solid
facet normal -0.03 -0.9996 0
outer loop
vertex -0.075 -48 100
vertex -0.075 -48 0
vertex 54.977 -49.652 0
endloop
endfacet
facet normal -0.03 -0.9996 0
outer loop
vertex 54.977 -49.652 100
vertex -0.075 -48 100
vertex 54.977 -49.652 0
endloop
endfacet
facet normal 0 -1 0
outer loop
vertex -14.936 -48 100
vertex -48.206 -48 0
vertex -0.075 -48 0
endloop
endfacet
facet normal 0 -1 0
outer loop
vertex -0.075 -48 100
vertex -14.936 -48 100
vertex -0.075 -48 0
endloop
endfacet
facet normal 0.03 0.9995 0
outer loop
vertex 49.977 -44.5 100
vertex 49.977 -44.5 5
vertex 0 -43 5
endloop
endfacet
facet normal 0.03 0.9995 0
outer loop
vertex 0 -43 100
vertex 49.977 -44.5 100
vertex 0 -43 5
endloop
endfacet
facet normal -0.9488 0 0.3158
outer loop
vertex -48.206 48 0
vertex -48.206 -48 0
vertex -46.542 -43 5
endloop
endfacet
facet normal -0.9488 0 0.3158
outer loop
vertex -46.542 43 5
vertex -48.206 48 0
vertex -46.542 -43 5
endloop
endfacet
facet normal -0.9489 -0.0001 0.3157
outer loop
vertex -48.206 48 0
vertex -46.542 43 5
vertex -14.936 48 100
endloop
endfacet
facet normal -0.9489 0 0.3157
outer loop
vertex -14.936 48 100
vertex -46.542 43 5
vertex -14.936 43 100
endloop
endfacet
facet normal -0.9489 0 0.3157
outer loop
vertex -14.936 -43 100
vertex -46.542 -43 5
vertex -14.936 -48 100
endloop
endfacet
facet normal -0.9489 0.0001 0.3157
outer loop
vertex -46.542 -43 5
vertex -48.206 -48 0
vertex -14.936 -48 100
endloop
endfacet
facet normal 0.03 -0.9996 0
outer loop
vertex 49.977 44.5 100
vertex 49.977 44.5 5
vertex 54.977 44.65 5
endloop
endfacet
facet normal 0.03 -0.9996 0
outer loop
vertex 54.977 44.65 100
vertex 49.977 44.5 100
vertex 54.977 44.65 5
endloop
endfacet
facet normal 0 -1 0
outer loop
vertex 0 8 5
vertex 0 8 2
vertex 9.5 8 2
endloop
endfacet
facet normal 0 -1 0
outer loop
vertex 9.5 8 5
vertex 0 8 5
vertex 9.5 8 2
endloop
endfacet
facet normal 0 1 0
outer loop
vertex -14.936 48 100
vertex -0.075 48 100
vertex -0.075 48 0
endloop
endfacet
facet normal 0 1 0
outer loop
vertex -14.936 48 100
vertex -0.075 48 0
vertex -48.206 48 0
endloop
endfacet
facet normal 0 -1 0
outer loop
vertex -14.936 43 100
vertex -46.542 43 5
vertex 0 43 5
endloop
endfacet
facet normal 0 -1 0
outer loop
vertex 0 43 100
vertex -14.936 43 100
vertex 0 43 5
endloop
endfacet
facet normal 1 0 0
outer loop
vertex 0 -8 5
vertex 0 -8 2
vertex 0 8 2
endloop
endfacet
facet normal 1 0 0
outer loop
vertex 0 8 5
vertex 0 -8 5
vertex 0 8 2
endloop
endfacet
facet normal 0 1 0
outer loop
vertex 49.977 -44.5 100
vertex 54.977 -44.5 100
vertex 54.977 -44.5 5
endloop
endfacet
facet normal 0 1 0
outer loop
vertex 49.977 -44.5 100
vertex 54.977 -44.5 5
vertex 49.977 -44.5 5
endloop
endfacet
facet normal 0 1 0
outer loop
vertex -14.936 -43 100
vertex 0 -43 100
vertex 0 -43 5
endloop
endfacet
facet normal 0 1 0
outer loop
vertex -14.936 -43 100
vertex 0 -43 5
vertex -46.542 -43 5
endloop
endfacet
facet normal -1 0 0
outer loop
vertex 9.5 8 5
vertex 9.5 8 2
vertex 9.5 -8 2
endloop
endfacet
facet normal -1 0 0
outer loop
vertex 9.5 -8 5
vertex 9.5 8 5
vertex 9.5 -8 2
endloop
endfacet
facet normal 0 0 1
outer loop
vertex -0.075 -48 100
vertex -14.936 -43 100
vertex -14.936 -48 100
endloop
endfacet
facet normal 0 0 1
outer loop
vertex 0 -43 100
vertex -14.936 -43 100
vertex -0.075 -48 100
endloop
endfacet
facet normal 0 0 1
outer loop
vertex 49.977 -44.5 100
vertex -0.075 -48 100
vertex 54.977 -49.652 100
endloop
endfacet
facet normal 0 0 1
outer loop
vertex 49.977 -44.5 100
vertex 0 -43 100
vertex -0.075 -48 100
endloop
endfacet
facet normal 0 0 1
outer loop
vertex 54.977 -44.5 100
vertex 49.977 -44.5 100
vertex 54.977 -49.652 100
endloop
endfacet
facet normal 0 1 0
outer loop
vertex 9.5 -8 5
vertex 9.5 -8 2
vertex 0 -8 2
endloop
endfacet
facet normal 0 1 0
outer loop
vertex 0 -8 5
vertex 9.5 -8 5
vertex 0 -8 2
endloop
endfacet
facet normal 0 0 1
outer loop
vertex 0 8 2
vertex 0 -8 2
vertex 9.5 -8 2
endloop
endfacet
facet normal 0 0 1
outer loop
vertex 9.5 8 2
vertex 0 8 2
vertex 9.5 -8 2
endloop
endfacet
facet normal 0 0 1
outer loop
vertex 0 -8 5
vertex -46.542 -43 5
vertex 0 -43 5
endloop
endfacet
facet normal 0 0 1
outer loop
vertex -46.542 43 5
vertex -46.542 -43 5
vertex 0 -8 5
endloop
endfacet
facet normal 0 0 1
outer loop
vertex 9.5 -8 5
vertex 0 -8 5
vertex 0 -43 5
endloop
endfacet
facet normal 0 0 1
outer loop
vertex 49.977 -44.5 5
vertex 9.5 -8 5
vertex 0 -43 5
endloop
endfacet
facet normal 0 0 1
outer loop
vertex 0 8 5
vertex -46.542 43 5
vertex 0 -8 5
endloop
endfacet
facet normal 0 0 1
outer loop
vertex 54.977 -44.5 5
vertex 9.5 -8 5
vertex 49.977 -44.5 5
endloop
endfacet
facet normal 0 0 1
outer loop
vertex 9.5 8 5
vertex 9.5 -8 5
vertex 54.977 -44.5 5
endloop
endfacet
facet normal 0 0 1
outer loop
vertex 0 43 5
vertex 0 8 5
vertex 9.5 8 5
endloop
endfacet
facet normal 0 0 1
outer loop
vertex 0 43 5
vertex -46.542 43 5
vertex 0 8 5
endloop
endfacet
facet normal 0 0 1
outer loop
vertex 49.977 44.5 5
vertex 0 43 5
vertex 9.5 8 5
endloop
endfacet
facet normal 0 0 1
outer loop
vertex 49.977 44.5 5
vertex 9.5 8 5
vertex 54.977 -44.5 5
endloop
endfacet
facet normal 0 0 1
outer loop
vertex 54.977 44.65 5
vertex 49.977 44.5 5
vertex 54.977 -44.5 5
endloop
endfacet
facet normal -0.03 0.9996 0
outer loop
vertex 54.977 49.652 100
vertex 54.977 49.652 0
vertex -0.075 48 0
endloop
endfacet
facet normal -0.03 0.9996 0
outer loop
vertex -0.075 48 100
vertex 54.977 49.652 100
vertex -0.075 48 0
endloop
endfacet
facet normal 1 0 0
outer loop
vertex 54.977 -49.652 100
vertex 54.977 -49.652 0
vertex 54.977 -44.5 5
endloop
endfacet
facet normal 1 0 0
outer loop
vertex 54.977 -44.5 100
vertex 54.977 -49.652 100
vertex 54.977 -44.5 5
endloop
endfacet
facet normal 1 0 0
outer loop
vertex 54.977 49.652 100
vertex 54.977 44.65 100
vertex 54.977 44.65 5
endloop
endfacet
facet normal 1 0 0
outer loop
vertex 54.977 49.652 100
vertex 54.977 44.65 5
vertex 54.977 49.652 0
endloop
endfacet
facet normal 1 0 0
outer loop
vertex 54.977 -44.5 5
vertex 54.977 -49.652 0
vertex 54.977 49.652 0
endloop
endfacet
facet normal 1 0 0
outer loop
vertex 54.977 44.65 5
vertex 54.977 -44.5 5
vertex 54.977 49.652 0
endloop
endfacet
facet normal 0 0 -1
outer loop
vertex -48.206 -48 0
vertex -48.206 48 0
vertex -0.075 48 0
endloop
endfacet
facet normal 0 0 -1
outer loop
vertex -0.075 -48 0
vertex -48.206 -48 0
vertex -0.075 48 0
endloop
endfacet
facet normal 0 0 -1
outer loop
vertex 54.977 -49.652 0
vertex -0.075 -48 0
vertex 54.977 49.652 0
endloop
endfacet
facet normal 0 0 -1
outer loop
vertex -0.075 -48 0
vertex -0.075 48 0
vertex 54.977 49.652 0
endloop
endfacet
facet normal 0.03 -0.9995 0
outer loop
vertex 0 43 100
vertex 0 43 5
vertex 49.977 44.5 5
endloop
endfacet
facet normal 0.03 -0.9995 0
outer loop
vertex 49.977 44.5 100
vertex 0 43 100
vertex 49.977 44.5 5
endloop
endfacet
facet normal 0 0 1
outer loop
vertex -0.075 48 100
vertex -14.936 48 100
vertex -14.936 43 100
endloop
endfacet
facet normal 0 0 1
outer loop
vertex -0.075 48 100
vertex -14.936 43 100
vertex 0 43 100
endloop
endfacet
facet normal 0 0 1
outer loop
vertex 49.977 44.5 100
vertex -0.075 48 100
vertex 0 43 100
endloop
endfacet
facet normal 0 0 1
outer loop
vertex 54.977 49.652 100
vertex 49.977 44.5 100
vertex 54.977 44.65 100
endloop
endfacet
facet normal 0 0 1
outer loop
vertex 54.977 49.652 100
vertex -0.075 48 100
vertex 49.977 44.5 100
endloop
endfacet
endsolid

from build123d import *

# Parameters (mm, degrees)
F1_DEPTH = 5
F2_DEPTH = 100
F3_DEPTH = 2
F5_DEPTH = 96


with BuildPart() as f1:
    # F0 (on Top) → F1 (new body)
    with BuildSketch(Plane.XY):
        Polygon((49.977495, 44.5), (0, 43), (-50, 43), (-50, -43), (0, -43), (49.977495, -44.5), (54.977495, -44.5), (54.977495, 44.650068), align=None)
        Polygon((0, -8), (0, 8), (9.5, 8), (9.5, 0), (9.5, -8), align=None, mode=Mode.SUBTRACT)
    extrude(amount=F1_DEPTH)

    # F0 (on Top) → F2 (join)
    with BuildSketch(Plane.XY):
        Polygon((-50, 43), (0, 43), (49.977495, 44.5), (54.977495, 44.650068), (54.977495, 49.652319), (-0.075017, 48), (-55, 48), (-55, -48), (-0.075017, -48), (54.977495, -49.652319), (54.977495, -44.5), (49.977495, -44.5), (0, -43), (-50, -43), align=None)
    extrude(amount=F2_DEPTH)

    # F0 (on Top) → F3 (join)
    with BuildSketch(Plane.XY):
        Polygon((9.5, 8), (0, 8), (0, -8), (9.5, -8), (9.5, 0), align=None)
    extrude(amount=F3_DEPTH)

    # F4 (on face) → F5 (cut)
    with BuildSketch(Plane.XZ.offset(48)):
        Polygon((-55, 0), (-48.205912, 0), (-14.9364, 100), (-55, 100), align=None)
    extrude(amount=-F5_DEPTH, mode=Mode.SUBTRACT)


solid = f1.part
